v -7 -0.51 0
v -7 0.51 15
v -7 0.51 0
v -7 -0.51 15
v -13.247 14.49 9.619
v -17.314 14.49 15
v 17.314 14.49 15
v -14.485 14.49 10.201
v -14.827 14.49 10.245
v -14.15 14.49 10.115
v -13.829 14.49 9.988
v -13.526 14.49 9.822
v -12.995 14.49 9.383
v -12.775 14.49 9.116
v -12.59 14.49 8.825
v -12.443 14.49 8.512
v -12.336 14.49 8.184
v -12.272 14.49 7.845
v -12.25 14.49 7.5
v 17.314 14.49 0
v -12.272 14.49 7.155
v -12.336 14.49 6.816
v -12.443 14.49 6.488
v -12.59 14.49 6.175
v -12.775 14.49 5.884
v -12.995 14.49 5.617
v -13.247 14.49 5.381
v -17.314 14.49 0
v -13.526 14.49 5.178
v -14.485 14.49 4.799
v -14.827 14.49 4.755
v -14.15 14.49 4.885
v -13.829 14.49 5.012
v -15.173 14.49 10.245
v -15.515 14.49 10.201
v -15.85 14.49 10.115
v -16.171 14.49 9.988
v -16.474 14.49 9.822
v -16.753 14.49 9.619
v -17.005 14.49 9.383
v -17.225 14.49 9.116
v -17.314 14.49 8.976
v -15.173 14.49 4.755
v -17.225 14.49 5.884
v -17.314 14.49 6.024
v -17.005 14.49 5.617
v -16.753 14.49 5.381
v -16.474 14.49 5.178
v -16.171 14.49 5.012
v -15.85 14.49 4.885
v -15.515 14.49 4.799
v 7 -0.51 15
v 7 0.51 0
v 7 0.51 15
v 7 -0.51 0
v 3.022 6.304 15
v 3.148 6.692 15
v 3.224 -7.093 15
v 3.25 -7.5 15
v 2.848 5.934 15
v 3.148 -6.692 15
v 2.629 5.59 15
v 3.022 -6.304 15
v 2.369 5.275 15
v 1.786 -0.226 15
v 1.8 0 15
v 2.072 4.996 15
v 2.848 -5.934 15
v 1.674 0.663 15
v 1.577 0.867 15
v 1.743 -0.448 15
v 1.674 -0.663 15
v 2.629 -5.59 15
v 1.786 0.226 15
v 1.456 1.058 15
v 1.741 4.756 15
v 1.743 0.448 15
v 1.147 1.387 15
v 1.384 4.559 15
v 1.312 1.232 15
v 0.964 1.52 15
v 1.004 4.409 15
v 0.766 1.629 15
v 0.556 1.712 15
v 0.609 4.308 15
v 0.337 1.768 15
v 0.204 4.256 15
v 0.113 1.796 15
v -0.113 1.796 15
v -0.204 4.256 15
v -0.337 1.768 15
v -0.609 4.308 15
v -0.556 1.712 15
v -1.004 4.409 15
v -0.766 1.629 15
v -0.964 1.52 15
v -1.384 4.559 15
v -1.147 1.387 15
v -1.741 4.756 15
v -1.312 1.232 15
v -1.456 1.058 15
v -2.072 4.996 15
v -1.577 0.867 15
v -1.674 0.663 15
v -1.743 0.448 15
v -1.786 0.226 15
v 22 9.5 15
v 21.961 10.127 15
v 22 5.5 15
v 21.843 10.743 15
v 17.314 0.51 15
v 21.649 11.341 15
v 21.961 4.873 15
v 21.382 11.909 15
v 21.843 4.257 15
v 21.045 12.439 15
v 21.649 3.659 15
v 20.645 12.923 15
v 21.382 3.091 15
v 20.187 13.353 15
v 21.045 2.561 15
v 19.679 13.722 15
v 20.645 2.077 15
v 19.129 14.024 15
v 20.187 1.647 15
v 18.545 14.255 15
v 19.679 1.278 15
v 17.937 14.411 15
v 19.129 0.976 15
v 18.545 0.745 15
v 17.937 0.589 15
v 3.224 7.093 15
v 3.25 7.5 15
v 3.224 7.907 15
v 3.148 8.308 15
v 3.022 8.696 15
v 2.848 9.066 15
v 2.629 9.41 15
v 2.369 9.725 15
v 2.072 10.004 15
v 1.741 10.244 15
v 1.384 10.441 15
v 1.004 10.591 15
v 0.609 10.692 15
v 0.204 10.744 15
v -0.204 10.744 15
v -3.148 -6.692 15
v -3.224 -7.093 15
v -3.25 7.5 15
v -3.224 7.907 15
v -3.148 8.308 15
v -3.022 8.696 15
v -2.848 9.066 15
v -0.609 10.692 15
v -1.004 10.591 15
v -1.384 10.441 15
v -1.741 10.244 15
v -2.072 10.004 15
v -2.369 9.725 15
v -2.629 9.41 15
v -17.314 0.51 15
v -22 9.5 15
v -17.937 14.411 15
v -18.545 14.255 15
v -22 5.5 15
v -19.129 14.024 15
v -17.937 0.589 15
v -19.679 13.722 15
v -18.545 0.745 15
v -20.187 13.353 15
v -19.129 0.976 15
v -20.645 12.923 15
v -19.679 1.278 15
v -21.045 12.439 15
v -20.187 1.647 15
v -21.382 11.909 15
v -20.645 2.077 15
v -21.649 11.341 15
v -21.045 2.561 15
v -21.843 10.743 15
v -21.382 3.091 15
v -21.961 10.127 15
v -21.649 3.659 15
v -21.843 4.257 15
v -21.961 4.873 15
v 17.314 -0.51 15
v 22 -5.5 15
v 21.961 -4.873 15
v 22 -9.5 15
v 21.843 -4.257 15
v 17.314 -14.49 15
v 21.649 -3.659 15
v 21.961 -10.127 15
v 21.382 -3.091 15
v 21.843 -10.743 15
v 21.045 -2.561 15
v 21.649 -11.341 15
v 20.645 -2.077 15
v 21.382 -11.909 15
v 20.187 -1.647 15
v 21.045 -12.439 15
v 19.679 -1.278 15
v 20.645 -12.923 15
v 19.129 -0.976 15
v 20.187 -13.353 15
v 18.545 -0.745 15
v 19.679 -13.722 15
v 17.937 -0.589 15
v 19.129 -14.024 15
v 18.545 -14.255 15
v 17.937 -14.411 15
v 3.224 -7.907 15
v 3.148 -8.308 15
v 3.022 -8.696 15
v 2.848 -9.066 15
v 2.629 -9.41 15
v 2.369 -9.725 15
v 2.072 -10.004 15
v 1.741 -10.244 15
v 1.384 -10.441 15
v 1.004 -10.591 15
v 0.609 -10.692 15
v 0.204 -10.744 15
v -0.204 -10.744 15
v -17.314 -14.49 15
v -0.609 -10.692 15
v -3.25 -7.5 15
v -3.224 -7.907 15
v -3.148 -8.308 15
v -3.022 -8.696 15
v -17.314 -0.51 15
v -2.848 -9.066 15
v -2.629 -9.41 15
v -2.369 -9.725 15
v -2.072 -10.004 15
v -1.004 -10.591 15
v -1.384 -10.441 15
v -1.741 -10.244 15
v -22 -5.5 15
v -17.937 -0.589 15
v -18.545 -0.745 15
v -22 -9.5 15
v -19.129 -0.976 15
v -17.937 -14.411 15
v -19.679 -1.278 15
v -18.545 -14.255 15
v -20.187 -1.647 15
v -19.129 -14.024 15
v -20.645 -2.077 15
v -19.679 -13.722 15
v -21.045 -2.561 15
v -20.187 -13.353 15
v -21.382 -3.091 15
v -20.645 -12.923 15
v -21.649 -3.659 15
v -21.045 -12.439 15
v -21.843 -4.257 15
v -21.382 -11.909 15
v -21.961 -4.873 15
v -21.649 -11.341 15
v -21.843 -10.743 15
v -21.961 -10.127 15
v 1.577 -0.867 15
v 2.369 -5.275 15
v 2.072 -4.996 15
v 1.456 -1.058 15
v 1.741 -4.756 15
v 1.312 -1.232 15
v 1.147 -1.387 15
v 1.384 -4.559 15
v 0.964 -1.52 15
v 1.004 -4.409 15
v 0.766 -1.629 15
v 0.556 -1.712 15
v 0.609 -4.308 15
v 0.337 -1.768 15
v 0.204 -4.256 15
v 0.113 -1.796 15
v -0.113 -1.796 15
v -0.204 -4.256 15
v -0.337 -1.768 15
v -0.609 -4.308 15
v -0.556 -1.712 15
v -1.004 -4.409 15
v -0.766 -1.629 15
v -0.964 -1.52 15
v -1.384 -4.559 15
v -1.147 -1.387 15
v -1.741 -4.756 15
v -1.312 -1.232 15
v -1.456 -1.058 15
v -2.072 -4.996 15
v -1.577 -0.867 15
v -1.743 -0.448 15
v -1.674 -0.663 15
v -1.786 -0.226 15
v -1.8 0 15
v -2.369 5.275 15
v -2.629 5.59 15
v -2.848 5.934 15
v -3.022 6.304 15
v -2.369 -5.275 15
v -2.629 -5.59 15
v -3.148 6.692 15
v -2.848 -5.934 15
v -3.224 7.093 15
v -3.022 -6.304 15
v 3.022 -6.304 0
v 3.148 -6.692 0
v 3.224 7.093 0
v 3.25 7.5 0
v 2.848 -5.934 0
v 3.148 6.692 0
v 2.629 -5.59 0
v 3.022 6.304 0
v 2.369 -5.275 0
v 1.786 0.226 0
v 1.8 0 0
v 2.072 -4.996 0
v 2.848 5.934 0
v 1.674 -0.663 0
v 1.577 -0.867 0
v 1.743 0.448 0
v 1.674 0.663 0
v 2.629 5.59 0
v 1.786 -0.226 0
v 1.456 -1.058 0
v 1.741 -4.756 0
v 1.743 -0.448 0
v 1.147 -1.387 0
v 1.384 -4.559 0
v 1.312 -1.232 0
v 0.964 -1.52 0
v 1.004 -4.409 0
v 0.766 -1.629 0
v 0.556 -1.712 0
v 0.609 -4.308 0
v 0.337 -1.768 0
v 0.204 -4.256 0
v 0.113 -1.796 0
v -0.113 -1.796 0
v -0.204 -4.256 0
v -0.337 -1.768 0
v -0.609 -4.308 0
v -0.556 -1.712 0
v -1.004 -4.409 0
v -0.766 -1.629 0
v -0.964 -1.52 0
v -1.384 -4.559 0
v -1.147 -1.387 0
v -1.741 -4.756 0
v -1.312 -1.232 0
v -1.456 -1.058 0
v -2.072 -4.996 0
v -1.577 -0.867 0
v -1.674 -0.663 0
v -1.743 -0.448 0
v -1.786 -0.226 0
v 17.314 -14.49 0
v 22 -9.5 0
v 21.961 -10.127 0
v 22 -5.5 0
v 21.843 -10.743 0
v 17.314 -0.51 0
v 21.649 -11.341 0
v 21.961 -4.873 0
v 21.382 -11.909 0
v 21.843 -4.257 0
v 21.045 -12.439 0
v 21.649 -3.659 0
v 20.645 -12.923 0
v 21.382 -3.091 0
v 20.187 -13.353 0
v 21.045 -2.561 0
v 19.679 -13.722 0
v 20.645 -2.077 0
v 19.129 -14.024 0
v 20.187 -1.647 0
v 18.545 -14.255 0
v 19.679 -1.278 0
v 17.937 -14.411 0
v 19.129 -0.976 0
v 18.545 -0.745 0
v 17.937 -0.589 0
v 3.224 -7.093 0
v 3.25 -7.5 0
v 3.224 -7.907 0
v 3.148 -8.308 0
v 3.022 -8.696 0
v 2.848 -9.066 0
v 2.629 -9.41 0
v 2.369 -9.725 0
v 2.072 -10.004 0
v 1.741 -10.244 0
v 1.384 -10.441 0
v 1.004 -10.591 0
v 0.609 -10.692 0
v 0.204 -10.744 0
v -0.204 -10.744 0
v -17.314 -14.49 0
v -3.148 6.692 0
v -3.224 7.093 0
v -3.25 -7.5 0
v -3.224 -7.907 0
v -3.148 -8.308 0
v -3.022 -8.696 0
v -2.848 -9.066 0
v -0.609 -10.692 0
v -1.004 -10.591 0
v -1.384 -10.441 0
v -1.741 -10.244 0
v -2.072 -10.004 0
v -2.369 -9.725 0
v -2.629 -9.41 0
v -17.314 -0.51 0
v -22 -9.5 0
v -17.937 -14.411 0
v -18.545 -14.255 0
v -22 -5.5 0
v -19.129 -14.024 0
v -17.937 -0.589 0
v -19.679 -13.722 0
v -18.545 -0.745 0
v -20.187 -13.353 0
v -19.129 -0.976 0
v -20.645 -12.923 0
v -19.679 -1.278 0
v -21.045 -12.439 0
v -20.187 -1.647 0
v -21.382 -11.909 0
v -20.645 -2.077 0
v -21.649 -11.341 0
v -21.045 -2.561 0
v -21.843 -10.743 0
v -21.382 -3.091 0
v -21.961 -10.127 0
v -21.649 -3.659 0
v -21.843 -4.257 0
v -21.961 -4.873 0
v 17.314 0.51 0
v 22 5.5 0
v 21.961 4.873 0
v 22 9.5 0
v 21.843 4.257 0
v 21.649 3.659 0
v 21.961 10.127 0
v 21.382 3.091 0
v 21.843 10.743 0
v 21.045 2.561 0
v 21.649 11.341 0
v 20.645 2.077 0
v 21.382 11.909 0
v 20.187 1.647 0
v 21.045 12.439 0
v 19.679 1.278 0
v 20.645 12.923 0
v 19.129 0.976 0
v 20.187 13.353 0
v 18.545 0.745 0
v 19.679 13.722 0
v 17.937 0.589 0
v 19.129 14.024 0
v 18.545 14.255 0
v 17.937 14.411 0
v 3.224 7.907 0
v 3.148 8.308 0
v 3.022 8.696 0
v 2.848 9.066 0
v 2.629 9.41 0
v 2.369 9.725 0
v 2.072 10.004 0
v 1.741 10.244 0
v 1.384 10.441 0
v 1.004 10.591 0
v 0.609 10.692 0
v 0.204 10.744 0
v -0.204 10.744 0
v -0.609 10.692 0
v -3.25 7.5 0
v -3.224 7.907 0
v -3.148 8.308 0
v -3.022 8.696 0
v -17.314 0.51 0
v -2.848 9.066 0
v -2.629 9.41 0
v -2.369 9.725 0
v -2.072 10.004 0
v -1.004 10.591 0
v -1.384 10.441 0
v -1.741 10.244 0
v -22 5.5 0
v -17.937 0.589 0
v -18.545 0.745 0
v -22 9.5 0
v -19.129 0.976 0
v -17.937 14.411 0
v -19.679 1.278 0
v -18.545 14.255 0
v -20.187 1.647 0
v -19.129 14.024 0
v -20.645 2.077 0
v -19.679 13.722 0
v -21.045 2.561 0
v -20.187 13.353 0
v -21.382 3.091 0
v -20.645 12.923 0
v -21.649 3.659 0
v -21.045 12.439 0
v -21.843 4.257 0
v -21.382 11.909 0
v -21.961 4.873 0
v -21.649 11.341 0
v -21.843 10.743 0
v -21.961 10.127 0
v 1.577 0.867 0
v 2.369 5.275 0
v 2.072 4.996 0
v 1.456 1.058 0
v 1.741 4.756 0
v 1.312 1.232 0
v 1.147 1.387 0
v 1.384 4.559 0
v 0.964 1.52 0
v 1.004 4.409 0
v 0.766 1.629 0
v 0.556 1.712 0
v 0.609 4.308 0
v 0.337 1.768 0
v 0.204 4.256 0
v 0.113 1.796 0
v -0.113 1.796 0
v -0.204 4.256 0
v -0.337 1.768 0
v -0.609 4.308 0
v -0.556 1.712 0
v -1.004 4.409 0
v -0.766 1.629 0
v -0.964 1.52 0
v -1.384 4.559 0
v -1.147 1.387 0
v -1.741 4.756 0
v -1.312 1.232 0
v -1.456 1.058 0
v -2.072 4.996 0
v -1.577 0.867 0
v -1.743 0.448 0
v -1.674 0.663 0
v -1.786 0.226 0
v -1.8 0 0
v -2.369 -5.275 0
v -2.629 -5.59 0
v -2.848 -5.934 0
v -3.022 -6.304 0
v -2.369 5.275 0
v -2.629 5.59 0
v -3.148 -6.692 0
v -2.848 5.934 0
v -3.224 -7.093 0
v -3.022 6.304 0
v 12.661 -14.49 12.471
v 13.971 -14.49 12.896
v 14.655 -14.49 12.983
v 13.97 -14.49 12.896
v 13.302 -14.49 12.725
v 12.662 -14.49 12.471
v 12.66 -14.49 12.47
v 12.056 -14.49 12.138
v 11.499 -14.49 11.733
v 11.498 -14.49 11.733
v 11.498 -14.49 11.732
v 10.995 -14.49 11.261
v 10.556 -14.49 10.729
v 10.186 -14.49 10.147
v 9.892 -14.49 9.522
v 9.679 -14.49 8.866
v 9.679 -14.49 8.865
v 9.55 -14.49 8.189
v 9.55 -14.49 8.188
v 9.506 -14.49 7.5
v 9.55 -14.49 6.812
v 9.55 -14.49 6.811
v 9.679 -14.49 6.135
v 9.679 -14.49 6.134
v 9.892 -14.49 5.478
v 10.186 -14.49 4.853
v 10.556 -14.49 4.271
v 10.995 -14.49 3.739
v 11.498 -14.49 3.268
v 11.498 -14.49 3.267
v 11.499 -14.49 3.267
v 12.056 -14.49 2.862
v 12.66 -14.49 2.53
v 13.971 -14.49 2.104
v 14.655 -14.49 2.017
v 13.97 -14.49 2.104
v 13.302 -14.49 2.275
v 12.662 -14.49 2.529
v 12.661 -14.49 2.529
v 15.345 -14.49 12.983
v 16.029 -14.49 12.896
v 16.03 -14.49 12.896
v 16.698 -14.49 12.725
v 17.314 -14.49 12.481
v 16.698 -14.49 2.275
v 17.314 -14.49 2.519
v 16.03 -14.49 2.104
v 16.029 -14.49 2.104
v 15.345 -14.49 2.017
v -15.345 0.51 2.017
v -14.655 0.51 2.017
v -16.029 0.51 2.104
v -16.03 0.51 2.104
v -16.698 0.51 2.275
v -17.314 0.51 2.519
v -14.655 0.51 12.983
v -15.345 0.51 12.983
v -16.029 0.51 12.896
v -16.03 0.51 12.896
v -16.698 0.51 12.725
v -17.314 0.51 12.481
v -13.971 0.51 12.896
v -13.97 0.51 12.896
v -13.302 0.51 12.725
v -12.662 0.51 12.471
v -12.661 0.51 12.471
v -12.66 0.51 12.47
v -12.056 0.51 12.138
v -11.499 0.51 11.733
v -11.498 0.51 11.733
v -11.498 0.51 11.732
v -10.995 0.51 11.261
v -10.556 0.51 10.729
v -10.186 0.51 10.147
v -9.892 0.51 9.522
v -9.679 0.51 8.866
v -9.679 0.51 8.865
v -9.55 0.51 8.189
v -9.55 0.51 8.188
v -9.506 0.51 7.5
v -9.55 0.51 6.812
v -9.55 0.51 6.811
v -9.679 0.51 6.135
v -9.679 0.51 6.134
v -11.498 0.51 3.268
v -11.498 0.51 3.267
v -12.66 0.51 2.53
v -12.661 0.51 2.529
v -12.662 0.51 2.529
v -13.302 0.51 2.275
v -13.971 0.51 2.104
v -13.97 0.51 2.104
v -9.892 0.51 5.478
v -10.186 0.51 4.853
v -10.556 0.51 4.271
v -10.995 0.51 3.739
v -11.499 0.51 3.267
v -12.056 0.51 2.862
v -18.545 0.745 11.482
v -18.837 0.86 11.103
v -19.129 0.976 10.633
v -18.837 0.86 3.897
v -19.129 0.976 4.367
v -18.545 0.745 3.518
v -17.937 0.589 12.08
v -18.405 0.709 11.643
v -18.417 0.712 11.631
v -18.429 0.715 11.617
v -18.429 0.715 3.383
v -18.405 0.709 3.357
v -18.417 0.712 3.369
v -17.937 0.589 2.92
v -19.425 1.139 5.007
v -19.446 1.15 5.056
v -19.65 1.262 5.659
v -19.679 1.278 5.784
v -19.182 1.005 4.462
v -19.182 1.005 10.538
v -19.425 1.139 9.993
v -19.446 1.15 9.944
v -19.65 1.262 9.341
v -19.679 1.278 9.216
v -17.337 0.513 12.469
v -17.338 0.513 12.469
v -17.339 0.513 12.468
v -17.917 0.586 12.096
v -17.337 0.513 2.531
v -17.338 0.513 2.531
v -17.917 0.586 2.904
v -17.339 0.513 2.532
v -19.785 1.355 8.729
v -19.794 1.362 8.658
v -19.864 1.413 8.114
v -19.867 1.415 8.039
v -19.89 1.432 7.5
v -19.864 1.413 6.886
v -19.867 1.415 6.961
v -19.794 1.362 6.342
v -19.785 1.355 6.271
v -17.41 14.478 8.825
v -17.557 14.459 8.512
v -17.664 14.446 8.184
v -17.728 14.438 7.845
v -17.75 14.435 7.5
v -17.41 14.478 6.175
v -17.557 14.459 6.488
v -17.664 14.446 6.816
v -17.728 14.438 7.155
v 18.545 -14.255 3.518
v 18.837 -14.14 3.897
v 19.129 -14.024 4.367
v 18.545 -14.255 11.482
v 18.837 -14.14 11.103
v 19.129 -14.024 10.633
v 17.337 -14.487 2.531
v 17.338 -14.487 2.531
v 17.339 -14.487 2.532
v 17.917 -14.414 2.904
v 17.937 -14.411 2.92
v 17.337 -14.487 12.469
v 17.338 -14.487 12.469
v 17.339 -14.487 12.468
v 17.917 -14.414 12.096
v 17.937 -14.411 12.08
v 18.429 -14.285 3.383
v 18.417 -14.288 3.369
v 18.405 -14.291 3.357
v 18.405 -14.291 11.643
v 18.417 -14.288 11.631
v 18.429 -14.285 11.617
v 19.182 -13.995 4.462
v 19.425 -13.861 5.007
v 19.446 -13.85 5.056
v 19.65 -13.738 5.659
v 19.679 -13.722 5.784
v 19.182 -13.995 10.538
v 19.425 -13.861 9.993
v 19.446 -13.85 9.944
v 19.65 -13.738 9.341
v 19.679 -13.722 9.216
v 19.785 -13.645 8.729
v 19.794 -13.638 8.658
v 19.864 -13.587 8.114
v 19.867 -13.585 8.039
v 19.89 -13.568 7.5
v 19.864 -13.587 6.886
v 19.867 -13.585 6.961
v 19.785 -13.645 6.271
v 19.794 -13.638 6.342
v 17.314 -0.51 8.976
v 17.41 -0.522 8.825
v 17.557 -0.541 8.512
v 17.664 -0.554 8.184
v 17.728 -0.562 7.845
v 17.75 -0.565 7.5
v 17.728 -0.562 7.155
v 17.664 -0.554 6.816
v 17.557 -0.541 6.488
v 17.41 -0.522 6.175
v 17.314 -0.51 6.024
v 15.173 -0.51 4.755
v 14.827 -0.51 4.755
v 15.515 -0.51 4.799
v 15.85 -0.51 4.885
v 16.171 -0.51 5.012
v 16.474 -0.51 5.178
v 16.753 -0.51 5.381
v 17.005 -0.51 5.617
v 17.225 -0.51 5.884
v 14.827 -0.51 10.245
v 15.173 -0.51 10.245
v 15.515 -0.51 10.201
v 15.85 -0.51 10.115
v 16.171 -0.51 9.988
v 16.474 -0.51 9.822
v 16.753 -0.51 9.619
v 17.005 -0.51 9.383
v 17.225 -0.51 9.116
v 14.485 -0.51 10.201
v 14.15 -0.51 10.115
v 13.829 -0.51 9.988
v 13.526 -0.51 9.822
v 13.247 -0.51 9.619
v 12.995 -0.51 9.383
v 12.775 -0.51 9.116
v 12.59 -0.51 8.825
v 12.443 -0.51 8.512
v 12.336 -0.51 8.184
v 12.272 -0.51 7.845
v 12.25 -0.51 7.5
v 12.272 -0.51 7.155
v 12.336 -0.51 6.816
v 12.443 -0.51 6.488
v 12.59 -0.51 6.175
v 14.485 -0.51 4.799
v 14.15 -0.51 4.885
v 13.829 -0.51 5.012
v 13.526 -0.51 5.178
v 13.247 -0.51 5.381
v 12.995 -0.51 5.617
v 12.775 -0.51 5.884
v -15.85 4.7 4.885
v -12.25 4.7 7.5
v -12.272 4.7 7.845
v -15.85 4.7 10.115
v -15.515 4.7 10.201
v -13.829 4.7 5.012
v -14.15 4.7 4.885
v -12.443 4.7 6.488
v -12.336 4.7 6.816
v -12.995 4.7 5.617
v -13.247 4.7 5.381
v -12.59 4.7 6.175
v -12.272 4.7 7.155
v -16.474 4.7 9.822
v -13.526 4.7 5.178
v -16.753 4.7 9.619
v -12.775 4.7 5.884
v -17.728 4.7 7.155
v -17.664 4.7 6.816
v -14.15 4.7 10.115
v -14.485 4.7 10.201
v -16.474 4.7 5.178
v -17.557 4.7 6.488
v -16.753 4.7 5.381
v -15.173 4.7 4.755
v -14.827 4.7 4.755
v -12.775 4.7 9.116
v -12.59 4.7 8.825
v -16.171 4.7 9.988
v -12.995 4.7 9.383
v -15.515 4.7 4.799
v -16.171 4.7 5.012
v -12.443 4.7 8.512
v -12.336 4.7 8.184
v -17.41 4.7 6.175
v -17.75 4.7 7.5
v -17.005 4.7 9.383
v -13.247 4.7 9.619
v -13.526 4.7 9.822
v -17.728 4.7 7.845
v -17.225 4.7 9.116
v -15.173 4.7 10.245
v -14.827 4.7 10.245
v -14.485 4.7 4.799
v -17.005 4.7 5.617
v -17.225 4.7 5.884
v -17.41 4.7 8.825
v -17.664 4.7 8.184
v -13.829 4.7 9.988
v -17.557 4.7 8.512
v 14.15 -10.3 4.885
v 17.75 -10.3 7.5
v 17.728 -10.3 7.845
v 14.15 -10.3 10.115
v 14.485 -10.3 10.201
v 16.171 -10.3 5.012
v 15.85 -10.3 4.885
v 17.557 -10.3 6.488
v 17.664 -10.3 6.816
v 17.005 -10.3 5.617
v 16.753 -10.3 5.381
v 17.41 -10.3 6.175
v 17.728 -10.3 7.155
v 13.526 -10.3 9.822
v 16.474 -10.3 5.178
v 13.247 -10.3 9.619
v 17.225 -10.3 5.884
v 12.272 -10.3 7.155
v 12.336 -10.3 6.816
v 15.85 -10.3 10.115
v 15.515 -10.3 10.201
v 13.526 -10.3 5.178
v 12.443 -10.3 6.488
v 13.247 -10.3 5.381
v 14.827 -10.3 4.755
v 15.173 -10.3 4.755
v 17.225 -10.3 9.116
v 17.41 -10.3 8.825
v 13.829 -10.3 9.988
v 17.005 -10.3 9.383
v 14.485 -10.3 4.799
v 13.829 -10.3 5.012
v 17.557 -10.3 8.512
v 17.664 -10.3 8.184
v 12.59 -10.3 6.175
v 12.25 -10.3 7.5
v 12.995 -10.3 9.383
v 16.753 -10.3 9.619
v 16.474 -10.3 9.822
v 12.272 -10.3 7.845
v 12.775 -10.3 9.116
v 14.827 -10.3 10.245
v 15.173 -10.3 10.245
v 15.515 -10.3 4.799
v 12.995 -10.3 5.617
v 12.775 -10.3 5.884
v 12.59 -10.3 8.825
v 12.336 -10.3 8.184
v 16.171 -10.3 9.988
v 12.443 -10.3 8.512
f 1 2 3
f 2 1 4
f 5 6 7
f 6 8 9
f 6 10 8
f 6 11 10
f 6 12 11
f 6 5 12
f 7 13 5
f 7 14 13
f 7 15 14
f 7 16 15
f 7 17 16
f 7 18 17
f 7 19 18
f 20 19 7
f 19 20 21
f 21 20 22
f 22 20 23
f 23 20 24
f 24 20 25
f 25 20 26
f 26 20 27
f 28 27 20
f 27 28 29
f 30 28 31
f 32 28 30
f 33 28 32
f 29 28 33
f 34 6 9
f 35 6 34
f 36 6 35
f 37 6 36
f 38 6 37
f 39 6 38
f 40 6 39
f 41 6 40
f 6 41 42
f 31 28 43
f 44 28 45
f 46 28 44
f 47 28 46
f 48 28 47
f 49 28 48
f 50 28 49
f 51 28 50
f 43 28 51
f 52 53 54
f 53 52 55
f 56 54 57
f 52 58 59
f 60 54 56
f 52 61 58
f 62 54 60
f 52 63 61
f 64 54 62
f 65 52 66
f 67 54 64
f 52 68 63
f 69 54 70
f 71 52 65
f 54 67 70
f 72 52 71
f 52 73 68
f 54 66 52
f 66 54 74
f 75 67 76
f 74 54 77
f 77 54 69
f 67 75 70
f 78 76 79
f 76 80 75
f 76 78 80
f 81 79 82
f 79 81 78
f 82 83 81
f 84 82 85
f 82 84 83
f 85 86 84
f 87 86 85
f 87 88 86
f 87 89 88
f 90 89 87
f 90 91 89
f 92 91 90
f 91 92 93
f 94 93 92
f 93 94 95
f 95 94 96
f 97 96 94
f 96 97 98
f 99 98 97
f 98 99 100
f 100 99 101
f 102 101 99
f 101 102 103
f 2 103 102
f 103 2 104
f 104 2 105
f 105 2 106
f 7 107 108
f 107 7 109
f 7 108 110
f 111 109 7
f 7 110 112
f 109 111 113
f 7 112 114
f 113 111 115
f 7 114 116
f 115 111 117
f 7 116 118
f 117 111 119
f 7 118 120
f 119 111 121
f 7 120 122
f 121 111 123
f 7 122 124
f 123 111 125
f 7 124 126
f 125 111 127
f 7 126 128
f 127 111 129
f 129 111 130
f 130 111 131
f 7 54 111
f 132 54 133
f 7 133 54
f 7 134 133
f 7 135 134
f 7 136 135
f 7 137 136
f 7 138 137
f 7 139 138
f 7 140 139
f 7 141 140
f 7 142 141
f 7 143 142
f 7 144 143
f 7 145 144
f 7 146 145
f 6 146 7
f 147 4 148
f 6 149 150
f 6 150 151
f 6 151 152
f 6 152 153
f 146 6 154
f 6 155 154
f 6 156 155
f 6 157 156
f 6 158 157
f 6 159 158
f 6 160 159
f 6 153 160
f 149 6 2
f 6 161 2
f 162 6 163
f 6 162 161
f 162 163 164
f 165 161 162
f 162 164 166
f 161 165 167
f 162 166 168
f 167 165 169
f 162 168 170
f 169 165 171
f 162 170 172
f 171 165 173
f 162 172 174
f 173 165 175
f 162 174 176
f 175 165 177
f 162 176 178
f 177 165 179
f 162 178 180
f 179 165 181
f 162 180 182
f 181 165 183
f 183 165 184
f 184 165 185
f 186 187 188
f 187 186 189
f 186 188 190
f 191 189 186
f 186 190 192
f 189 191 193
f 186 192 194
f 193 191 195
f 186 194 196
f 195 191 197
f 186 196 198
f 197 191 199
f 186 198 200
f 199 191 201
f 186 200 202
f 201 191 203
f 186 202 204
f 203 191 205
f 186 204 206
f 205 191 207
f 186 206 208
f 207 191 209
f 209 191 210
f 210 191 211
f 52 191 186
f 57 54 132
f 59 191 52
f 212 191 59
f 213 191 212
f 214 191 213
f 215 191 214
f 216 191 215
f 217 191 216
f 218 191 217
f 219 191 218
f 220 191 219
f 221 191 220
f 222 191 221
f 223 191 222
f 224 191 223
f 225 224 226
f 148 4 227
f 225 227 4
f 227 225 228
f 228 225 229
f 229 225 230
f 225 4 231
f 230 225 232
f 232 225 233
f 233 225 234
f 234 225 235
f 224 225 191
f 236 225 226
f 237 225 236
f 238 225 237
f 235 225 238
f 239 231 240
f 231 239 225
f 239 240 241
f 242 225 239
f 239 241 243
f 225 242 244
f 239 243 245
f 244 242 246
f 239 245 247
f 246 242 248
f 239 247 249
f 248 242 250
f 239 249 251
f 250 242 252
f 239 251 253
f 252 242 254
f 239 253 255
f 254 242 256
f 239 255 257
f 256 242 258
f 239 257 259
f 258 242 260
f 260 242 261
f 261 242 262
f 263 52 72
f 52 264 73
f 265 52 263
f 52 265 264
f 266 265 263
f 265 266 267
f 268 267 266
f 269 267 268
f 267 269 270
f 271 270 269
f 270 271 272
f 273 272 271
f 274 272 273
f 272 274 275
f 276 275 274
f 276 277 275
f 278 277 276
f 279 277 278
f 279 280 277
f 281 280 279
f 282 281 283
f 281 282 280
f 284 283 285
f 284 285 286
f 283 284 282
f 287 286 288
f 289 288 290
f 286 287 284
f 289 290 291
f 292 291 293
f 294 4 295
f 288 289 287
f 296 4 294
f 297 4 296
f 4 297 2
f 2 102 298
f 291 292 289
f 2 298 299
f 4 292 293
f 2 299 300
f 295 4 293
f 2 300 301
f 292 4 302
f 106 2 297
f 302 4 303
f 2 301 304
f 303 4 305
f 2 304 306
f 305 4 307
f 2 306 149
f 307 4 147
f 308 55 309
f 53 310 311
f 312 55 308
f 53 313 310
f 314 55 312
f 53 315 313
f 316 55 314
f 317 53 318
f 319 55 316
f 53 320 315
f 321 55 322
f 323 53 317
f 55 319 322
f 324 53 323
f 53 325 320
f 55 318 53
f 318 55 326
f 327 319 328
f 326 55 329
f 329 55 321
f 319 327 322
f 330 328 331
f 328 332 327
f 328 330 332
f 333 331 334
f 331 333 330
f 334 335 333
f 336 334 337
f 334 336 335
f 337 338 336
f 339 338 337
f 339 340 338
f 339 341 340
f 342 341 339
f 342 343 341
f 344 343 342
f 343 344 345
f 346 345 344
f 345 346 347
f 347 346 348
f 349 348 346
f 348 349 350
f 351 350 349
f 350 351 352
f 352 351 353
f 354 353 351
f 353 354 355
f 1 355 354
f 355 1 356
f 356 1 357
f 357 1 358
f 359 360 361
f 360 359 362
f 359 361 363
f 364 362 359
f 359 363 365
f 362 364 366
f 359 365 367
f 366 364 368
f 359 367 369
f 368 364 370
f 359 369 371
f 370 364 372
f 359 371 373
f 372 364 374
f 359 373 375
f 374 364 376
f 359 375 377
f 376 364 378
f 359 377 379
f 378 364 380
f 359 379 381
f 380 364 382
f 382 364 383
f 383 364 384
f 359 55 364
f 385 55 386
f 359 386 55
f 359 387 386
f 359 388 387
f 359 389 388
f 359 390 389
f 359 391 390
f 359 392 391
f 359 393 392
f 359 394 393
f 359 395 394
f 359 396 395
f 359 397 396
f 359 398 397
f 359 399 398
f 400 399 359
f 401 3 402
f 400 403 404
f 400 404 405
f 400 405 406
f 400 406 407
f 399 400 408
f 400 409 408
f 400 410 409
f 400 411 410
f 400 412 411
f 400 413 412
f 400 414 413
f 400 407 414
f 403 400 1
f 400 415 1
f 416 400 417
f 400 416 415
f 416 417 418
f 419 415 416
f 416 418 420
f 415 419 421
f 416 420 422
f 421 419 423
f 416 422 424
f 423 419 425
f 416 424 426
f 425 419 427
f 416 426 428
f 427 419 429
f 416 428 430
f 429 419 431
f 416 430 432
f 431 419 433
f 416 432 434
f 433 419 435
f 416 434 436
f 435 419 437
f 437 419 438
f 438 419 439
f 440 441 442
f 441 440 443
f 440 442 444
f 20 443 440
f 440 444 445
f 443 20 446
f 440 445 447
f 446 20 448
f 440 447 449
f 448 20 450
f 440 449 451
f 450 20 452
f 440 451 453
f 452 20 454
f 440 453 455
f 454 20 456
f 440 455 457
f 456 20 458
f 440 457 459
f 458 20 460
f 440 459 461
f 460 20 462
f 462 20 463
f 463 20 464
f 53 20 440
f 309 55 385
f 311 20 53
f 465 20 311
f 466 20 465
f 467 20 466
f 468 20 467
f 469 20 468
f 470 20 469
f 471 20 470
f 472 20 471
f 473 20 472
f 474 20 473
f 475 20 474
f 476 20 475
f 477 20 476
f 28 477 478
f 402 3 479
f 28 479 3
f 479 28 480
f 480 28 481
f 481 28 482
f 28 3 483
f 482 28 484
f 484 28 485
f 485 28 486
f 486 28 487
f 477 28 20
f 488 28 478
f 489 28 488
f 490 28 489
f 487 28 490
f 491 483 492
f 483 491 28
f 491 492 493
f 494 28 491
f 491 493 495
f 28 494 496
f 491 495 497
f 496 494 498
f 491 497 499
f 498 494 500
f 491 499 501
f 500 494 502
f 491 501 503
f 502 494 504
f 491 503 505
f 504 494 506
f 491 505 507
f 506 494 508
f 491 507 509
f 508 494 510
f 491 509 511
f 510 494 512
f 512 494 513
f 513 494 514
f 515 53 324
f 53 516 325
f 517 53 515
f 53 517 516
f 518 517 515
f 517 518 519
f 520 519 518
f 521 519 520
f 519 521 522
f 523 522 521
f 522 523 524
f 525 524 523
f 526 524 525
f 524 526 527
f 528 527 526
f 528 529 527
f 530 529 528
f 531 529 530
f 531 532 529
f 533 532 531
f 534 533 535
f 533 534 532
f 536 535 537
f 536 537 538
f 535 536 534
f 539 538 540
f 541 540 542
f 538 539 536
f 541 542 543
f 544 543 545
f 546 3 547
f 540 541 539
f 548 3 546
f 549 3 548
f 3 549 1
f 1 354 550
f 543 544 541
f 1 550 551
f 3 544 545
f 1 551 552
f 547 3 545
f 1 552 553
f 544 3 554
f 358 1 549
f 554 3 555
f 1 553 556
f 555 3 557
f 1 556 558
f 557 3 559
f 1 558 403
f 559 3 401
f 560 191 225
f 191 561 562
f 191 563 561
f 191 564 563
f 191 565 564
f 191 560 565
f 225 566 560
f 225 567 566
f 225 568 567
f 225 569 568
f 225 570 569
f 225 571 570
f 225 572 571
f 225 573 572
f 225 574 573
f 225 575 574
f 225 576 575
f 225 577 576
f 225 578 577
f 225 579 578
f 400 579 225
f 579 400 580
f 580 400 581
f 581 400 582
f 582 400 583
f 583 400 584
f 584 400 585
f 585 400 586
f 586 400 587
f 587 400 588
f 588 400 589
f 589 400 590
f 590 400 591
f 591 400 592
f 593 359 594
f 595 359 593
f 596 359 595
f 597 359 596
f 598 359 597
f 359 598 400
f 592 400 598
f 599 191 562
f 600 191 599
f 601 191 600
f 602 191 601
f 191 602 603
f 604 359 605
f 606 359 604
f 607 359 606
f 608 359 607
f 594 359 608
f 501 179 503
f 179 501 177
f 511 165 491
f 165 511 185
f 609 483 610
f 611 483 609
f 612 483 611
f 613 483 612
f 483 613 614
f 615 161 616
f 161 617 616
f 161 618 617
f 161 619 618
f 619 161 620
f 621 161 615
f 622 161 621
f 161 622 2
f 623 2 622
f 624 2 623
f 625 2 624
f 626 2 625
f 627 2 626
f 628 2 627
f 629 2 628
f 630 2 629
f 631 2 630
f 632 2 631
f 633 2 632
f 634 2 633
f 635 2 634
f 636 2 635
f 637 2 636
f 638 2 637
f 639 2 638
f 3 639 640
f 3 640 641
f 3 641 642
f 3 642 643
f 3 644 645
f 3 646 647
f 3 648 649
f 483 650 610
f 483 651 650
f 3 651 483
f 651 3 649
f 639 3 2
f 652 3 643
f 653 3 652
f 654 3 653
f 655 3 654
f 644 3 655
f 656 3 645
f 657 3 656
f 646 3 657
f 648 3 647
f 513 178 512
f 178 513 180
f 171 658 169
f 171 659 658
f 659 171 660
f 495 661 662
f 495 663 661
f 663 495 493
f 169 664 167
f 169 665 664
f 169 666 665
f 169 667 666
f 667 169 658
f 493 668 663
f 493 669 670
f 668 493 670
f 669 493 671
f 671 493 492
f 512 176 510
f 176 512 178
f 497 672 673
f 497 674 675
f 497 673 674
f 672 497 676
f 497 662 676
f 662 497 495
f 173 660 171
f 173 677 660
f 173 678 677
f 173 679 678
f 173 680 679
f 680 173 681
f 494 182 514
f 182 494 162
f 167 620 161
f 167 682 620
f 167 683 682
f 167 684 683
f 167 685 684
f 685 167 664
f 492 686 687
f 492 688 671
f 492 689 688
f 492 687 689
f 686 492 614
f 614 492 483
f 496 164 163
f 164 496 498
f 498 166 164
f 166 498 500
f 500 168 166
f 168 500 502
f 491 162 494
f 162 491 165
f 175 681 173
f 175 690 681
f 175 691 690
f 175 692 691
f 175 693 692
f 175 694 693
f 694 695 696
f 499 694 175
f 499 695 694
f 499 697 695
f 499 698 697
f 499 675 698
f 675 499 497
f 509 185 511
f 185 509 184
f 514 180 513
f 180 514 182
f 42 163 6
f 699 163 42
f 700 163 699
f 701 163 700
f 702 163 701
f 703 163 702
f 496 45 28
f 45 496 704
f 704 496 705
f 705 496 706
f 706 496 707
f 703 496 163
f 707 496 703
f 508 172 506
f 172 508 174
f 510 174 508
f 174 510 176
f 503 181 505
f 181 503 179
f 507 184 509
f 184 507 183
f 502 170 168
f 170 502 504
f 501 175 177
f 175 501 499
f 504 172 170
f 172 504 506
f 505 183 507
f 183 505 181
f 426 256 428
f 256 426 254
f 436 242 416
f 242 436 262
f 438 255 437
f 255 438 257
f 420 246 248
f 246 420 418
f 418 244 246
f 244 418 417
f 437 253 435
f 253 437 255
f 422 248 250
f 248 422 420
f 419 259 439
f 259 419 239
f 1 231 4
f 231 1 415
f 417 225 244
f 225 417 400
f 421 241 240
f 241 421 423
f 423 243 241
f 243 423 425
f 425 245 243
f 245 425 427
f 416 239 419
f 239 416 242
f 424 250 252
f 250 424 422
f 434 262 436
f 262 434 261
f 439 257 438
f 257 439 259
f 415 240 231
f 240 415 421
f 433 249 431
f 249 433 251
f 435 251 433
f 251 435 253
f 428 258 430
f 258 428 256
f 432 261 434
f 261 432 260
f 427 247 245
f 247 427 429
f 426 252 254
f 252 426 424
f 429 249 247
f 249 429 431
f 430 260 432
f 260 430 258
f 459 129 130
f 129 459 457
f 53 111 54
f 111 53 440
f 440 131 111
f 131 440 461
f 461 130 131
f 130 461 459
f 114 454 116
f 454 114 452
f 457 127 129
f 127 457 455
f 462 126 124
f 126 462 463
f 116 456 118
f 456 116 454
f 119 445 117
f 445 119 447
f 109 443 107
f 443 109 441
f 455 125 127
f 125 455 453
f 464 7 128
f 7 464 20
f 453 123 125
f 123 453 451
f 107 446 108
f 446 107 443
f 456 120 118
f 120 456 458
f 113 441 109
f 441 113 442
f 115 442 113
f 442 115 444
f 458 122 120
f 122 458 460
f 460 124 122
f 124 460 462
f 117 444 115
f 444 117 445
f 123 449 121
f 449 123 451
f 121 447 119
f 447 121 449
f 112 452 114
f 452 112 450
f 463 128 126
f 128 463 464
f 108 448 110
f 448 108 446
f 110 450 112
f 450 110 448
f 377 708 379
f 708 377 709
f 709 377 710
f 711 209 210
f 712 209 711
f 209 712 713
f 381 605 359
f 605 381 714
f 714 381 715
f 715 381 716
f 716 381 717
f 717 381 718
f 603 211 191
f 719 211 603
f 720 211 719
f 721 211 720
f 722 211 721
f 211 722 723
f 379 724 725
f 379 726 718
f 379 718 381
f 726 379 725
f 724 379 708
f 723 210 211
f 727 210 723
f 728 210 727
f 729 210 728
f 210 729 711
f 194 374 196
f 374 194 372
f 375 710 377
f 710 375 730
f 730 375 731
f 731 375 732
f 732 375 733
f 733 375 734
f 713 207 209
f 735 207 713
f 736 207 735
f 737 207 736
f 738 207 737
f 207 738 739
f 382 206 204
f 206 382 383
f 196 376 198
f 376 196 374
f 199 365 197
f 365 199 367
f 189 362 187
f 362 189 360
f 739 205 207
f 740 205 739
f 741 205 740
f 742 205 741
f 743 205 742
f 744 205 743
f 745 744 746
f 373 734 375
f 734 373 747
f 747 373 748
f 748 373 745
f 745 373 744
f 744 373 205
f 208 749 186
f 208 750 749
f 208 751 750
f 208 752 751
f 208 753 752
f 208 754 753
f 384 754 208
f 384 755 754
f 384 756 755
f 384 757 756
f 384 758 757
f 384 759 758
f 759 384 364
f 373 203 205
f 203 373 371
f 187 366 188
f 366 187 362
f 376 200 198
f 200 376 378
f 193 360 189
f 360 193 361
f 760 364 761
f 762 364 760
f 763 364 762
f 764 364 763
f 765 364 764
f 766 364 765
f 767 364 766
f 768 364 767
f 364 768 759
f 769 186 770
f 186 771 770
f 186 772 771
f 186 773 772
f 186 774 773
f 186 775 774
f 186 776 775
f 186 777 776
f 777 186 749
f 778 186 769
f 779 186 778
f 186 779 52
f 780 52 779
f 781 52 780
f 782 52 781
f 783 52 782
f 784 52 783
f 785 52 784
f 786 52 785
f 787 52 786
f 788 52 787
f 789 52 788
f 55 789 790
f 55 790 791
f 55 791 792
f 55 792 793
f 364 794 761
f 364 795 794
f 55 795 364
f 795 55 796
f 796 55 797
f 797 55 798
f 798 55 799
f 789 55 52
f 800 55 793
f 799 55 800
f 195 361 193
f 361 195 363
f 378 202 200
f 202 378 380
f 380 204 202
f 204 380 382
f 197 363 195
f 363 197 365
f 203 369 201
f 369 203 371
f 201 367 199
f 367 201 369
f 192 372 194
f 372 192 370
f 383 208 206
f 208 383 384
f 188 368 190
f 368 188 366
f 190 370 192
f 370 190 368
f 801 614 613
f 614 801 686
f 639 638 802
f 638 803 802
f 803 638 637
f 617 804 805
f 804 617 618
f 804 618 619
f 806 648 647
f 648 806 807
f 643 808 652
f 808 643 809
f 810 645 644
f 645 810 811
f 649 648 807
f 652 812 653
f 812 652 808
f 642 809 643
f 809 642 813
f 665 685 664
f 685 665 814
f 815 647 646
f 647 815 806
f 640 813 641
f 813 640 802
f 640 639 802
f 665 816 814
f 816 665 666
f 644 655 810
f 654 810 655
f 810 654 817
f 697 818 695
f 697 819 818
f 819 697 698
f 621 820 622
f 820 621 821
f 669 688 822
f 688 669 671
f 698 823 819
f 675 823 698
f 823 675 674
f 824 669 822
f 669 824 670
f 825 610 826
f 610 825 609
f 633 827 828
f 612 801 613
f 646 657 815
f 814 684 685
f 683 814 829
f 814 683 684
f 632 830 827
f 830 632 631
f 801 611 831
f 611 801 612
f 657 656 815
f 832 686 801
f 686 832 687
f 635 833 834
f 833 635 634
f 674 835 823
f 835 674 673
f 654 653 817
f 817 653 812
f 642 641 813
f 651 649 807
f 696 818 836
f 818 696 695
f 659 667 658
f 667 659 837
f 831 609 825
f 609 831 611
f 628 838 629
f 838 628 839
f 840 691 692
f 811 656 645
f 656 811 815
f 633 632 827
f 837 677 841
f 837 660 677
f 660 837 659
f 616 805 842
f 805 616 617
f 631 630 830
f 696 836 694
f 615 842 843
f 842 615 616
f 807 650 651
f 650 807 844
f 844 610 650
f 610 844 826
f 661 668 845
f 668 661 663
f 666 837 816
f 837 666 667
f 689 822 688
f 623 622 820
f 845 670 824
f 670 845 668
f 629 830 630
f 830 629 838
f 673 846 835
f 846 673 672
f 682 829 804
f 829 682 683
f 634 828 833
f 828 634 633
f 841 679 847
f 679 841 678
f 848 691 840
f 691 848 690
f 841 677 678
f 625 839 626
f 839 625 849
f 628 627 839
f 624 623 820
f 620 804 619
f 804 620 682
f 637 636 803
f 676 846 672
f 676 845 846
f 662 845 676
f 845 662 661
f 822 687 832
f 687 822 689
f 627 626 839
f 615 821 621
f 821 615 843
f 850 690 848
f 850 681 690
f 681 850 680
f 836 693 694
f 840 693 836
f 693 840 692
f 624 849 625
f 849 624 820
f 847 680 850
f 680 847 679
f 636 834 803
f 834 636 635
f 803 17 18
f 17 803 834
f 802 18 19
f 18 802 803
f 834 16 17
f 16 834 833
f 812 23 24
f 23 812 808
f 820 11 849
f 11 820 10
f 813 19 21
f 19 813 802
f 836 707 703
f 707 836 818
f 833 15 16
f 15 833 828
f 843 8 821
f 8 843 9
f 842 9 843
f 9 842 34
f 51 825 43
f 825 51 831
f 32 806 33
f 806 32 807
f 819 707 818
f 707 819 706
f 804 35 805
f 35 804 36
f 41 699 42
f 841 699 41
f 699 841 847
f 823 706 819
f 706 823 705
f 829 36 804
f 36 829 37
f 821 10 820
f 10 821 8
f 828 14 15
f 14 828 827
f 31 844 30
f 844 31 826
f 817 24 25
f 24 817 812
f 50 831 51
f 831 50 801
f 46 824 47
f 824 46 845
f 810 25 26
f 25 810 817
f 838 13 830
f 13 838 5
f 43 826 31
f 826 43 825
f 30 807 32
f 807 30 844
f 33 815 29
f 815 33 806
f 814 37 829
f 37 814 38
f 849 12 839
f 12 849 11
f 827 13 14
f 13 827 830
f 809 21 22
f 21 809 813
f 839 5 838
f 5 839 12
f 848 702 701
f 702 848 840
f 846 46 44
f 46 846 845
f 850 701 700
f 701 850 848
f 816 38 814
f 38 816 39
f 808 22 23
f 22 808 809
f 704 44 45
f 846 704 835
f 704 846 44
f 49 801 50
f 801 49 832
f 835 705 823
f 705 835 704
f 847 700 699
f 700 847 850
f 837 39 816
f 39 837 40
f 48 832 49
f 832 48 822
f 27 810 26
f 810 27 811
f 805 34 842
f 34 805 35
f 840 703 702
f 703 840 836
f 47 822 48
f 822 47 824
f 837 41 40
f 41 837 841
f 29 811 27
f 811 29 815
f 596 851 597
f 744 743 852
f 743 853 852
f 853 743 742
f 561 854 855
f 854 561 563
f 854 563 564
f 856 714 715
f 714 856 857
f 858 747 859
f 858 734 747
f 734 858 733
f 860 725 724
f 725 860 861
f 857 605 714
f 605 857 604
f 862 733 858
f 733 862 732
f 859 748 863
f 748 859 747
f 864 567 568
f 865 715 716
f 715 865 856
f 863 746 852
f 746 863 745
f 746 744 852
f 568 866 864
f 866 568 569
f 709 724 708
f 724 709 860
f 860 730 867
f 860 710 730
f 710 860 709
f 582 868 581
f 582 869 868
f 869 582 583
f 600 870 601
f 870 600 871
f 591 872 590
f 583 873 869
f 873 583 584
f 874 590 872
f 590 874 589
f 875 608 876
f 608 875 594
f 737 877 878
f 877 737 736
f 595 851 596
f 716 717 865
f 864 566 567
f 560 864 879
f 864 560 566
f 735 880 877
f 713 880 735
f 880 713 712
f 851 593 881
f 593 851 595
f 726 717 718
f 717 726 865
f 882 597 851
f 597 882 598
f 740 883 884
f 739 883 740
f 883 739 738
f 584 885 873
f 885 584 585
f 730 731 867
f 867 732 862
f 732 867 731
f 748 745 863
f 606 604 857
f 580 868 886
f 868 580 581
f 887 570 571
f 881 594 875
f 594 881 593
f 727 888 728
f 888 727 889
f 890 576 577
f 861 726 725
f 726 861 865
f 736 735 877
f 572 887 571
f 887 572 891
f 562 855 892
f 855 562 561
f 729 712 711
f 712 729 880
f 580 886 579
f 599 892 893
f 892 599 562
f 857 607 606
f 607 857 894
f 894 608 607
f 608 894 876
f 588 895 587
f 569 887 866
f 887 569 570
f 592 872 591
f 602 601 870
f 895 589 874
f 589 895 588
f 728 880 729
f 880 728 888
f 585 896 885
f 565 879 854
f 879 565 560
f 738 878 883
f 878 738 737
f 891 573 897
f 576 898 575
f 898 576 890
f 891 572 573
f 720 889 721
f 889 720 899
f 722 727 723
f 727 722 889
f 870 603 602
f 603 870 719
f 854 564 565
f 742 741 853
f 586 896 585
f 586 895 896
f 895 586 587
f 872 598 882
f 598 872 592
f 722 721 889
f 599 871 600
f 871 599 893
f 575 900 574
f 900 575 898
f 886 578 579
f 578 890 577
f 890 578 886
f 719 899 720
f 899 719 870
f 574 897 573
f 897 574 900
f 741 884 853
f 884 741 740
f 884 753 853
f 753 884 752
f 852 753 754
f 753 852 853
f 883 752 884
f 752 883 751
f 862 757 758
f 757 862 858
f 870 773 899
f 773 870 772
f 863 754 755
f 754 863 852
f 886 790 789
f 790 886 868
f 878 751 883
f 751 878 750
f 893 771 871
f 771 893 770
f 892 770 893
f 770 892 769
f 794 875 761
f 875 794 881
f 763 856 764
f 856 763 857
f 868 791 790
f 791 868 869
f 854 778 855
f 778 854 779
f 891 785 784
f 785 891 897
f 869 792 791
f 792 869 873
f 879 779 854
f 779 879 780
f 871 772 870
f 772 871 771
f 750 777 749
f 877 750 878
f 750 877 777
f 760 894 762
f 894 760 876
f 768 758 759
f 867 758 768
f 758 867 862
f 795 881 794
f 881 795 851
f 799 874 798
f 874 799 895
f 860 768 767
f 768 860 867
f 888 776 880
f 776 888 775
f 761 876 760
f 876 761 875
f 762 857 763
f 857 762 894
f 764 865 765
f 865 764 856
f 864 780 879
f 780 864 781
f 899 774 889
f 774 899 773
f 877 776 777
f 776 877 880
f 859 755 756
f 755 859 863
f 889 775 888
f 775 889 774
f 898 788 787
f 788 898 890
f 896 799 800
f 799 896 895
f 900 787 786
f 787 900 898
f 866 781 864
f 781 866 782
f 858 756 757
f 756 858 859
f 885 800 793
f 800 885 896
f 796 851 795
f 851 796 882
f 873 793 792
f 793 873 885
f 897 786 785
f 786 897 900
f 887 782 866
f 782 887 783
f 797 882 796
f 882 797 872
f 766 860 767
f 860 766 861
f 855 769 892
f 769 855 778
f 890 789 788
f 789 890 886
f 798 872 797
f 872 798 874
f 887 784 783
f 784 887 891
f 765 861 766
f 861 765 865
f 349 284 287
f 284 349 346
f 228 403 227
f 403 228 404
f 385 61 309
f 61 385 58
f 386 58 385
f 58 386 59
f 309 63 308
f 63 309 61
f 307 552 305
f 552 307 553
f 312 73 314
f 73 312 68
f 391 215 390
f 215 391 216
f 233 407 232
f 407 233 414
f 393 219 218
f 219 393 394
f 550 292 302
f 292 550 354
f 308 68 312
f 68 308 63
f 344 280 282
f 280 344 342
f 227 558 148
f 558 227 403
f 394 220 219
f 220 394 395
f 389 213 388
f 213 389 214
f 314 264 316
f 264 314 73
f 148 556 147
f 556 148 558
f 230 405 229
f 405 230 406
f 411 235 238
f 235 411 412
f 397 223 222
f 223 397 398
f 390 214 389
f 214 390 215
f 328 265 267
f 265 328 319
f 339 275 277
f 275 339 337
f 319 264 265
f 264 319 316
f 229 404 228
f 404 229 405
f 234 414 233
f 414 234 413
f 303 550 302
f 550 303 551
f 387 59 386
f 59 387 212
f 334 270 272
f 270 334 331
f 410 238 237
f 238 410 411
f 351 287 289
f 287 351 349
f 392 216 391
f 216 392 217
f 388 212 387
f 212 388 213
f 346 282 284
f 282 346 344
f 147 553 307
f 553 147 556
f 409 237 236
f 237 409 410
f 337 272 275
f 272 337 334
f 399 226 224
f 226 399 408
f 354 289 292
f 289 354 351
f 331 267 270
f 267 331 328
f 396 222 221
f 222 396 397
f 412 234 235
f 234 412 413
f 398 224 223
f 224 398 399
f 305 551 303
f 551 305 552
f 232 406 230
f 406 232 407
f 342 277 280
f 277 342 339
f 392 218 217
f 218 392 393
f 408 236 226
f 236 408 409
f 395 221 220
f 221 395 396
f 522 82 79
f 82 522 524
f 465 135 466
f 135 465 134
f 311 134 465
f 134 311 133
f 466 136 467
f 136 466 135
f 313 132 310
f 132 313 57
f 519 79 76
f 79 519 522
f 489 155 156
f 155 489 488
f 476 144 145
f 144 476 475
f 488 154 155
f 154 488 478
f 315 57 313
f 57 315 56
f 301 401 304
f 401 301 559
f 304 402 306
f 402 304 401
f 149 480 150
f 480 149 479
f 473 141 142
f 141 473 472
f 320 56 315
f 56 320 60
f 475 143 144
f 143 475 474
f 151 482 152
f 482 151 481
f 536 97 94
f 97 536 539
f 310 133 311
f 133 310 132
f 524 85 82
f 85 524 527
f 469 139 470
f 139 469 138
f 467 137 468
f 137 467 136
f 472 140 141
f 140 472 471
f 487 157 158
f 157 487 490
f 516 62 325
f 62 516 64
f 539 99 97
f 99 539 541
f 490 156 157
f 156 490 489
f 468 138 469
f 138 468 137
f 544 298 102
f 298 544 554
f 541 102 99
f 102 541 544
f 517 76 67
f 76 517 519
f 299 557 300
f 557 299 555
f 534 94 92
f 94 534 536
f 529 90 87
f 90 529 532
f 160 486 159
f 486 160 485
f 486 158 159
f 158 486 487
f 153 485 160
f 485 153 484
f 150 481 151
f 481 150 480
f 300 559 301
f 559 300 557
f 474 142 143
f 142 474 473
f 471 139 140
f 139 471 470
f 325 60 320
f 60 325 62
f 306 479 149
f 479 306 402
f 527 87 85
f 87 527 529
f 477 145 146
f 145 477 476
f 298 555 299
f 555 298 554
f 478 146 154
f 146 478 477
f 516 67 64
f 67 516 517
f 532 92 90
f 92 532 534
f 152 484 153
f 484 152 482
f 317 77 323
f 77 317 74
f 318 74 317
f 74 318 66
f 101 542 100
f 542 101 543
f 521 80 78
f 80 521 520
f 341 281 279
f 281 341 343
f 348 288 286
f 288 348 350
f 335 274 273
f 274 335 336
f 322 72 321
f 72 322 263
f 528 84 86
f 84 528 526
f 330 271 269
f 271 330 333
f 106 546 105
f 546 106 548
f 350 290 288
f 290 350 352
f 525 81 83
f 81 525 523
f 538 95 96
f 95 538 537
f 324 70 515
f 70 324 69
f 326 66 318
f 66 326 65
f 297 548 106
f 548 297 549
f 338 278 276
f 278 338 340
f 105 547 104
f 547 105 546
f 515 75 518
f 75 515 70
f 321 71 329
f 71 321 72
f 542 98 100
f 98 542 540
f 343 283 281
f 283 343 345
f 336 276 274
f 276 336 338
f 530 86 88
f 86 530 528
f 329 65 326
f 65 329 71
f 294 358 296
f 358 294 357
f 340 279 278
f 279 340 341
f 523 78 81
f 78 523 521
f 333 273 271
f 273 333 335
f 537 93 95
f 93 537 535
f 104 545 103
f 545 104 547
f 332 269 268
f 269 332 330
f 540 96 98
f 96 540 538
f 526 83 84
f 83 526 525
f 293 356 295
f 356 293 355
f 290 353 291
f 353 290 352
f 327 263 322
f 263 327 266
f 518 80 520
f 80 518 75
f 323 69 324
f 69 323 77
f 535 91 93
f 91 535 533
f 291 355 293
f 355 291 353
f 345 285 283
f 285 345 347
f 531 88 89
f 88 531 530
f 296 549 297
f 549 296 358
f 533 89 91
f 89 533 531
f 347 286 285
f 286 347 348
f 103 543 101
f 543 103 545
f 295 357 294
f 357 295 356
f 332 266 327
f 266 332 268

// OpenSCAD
$fn = 50;


difference() {
	union() {
		hull() {
			translate(v = [-2.0000000000, 9.5000000000, 0]) {
				cylinder(h = 15, r = 5);
			}
			translate(v = [2.0000000000, 9.5000000000, 0]) {
				cylinder(h = 15, r = 5);
			}
			translate(v = [-2.0000000000, -9.5000000000, 0]) {
				cylinder(h = 15, r = 5);
			}
			translate(v = [2.0000000000, -9.5000000000, 0]) {
				cylinder(h = 15, r = 5);
			}
		}
		translate(v = [-7.5000000000, 7.5000000000, 0]) {
			hull() {
				translate(v = [-9.5000000000, 2.0000000000, 0]) {
					cylinder(h = 15, r = 5);
				}
				translate(v = [9.5000000000, 2.0000000000, 0]) {
					cylinder(h = 15, r = 5);
				}
				translate(v = [-9.5000000000, -2.0000000000, 0]) {
					cylinder(h = 15, r = 5);
				}
				translate(v = [9.5000000000, -2.0000000000, 0]) {
					cylinder(h = 15, r = 5);
				}
			}
		}
		translate(v = [-7.5000000000, -7.5000000000, 0]) {
			hull() {
				translate(v = [-9.5000000000, 2.0000000000, 0]) {
					cylinder(h = 15, r = 5);
				}
				translate(v = [9.5000000000, 2.0000000000, 0]) {
					cylinder(h = 15, r = 5);
				}
				translate(v = [-9.5000000000, -2.0000000000, 0]) {
					cylinder(h = 15, r = 5);
				}
				translate(v = [9.5000000000, -2.0000000000, 0]) {
					cylinder(h = 15, r = 5);
				}
			}
		}
		translate(v = [7.5000000000, 7.5000000000, 0]) {
			hull() {
				translate(v = [-9.5000000000, 2.0000000000, 0]) {
					cylinder(h = 15, r = 5);
				}
				translate(v = [9.5000000000, 2.0000000000, 0]) {
					cylinder(h = 15, r = 5);
				}
				translate(v = [-9.5000000000, -2.0000000000, 0]) {
					cylinder(h = 15, r = 5);
				}
				translate(v = [9.5000000000, -2.0000000000, 0]) {
					cylinder(h = 15, r = 5);
				}
			}
		}
		translate(v = [7.5000000000, -7.5000000000, 0]) {
			hull() {
				translate(v = [-9.5000000000, 2.0000000000, 0]) {
					cylinder(h = 15, r = 5);
				}
				translate(v = [9.5000000000, 2.0000000000, 0]) {
					cylinder(h = 15, r = 5);
				}
				translate(v = [-9.5000000000, -2.0000000000, 0]) {
					cylinder(h = 15, r = 5);
				}
				translate(v = [9.5000000000, -2.0000000000, 0]) {
					cylinder(h = 15, r = 5);
				}
			}
		}
	}
	union() {
		translate(v = [-15.0000000000, 0.5000000000, 7.5000000000]) {
			rotate(a = [90, 0, 0]) {
				difference() {
					union() {
						#translate(v = [0, 0, -14.0000000000]) {
							cylinder(h = 14, r = 2.2500000000);
						}
						#translate(v = [0, 0, -4.2000000000]) {
							cylinder(h = 4.2000000000, r1 = 2.7500000000, r2 = 5.5000000000);
						}
						#translate(v = [0, 0, -14.0000000000]) {
							cylinder(h = 14, r = 2.7500000000);
						}
						#translate(v = [0, 0, -14.0000000000]) {
							cylinder(h = 14, r = 2.2500000000);
						}
					}
					union();
				}
			}
		}
		translate(v = [15.0000000000, -14.5000000000, 7.5000000000]) {
			rotate(a = [90, 0, 0]) {
				difference() {
					union() {
						#translate(v = [0, 0, -14.0000000000]) {
							cylinder(h = 14, r = 2.2500000000);
						}
						#translate(v = [0, 0, -4.2000000000]) {
							cylinder(h = 4.2000000000, r1 = 2.7500000000, r2 = 5.5000000000);
						}
						#translate(v = [0, 0, -14.0000000000]) {
							cylinder(h = 14, r = 2.7500000000);
						}
						#translate(v = [0, 0, -14.0000000000]) {
							cylinder(h = 14, r = 2.2500000000);
						}
					}
					union();
				}
			}
		}
		translate(v = [0.0000000000, -7.5000000000, 0]) {
			translate(v = [0, 0, -100]) {
				cylinder(h = 200, r = 3.2500000000);
			}
		}
		translate(v = [0.0000000000, 7.5000000000, 0]) {
			translate(v = [0, 0, -100]) {
				cylinder(h = 200, r = 3.2500000000);
			}
		}
		translate(v = [0.0000000000, -7.5000000000, 0]) {
			translate(v = [0, 0, -100]) {
				cylinder(h = 200, r = 1.8000000000);
			}
		}
		translate(v = [0, 0, -100]) {
			cylinder(h = 200, r = 1.8000000000);
		}
		translate(v = [0.0000000000, 7.5000000000, 0]) {
			translate(v = [0, 0, -100]) {
				cylinder(h = 200, r = 1.8000000000);
			}
		}
	}
}
